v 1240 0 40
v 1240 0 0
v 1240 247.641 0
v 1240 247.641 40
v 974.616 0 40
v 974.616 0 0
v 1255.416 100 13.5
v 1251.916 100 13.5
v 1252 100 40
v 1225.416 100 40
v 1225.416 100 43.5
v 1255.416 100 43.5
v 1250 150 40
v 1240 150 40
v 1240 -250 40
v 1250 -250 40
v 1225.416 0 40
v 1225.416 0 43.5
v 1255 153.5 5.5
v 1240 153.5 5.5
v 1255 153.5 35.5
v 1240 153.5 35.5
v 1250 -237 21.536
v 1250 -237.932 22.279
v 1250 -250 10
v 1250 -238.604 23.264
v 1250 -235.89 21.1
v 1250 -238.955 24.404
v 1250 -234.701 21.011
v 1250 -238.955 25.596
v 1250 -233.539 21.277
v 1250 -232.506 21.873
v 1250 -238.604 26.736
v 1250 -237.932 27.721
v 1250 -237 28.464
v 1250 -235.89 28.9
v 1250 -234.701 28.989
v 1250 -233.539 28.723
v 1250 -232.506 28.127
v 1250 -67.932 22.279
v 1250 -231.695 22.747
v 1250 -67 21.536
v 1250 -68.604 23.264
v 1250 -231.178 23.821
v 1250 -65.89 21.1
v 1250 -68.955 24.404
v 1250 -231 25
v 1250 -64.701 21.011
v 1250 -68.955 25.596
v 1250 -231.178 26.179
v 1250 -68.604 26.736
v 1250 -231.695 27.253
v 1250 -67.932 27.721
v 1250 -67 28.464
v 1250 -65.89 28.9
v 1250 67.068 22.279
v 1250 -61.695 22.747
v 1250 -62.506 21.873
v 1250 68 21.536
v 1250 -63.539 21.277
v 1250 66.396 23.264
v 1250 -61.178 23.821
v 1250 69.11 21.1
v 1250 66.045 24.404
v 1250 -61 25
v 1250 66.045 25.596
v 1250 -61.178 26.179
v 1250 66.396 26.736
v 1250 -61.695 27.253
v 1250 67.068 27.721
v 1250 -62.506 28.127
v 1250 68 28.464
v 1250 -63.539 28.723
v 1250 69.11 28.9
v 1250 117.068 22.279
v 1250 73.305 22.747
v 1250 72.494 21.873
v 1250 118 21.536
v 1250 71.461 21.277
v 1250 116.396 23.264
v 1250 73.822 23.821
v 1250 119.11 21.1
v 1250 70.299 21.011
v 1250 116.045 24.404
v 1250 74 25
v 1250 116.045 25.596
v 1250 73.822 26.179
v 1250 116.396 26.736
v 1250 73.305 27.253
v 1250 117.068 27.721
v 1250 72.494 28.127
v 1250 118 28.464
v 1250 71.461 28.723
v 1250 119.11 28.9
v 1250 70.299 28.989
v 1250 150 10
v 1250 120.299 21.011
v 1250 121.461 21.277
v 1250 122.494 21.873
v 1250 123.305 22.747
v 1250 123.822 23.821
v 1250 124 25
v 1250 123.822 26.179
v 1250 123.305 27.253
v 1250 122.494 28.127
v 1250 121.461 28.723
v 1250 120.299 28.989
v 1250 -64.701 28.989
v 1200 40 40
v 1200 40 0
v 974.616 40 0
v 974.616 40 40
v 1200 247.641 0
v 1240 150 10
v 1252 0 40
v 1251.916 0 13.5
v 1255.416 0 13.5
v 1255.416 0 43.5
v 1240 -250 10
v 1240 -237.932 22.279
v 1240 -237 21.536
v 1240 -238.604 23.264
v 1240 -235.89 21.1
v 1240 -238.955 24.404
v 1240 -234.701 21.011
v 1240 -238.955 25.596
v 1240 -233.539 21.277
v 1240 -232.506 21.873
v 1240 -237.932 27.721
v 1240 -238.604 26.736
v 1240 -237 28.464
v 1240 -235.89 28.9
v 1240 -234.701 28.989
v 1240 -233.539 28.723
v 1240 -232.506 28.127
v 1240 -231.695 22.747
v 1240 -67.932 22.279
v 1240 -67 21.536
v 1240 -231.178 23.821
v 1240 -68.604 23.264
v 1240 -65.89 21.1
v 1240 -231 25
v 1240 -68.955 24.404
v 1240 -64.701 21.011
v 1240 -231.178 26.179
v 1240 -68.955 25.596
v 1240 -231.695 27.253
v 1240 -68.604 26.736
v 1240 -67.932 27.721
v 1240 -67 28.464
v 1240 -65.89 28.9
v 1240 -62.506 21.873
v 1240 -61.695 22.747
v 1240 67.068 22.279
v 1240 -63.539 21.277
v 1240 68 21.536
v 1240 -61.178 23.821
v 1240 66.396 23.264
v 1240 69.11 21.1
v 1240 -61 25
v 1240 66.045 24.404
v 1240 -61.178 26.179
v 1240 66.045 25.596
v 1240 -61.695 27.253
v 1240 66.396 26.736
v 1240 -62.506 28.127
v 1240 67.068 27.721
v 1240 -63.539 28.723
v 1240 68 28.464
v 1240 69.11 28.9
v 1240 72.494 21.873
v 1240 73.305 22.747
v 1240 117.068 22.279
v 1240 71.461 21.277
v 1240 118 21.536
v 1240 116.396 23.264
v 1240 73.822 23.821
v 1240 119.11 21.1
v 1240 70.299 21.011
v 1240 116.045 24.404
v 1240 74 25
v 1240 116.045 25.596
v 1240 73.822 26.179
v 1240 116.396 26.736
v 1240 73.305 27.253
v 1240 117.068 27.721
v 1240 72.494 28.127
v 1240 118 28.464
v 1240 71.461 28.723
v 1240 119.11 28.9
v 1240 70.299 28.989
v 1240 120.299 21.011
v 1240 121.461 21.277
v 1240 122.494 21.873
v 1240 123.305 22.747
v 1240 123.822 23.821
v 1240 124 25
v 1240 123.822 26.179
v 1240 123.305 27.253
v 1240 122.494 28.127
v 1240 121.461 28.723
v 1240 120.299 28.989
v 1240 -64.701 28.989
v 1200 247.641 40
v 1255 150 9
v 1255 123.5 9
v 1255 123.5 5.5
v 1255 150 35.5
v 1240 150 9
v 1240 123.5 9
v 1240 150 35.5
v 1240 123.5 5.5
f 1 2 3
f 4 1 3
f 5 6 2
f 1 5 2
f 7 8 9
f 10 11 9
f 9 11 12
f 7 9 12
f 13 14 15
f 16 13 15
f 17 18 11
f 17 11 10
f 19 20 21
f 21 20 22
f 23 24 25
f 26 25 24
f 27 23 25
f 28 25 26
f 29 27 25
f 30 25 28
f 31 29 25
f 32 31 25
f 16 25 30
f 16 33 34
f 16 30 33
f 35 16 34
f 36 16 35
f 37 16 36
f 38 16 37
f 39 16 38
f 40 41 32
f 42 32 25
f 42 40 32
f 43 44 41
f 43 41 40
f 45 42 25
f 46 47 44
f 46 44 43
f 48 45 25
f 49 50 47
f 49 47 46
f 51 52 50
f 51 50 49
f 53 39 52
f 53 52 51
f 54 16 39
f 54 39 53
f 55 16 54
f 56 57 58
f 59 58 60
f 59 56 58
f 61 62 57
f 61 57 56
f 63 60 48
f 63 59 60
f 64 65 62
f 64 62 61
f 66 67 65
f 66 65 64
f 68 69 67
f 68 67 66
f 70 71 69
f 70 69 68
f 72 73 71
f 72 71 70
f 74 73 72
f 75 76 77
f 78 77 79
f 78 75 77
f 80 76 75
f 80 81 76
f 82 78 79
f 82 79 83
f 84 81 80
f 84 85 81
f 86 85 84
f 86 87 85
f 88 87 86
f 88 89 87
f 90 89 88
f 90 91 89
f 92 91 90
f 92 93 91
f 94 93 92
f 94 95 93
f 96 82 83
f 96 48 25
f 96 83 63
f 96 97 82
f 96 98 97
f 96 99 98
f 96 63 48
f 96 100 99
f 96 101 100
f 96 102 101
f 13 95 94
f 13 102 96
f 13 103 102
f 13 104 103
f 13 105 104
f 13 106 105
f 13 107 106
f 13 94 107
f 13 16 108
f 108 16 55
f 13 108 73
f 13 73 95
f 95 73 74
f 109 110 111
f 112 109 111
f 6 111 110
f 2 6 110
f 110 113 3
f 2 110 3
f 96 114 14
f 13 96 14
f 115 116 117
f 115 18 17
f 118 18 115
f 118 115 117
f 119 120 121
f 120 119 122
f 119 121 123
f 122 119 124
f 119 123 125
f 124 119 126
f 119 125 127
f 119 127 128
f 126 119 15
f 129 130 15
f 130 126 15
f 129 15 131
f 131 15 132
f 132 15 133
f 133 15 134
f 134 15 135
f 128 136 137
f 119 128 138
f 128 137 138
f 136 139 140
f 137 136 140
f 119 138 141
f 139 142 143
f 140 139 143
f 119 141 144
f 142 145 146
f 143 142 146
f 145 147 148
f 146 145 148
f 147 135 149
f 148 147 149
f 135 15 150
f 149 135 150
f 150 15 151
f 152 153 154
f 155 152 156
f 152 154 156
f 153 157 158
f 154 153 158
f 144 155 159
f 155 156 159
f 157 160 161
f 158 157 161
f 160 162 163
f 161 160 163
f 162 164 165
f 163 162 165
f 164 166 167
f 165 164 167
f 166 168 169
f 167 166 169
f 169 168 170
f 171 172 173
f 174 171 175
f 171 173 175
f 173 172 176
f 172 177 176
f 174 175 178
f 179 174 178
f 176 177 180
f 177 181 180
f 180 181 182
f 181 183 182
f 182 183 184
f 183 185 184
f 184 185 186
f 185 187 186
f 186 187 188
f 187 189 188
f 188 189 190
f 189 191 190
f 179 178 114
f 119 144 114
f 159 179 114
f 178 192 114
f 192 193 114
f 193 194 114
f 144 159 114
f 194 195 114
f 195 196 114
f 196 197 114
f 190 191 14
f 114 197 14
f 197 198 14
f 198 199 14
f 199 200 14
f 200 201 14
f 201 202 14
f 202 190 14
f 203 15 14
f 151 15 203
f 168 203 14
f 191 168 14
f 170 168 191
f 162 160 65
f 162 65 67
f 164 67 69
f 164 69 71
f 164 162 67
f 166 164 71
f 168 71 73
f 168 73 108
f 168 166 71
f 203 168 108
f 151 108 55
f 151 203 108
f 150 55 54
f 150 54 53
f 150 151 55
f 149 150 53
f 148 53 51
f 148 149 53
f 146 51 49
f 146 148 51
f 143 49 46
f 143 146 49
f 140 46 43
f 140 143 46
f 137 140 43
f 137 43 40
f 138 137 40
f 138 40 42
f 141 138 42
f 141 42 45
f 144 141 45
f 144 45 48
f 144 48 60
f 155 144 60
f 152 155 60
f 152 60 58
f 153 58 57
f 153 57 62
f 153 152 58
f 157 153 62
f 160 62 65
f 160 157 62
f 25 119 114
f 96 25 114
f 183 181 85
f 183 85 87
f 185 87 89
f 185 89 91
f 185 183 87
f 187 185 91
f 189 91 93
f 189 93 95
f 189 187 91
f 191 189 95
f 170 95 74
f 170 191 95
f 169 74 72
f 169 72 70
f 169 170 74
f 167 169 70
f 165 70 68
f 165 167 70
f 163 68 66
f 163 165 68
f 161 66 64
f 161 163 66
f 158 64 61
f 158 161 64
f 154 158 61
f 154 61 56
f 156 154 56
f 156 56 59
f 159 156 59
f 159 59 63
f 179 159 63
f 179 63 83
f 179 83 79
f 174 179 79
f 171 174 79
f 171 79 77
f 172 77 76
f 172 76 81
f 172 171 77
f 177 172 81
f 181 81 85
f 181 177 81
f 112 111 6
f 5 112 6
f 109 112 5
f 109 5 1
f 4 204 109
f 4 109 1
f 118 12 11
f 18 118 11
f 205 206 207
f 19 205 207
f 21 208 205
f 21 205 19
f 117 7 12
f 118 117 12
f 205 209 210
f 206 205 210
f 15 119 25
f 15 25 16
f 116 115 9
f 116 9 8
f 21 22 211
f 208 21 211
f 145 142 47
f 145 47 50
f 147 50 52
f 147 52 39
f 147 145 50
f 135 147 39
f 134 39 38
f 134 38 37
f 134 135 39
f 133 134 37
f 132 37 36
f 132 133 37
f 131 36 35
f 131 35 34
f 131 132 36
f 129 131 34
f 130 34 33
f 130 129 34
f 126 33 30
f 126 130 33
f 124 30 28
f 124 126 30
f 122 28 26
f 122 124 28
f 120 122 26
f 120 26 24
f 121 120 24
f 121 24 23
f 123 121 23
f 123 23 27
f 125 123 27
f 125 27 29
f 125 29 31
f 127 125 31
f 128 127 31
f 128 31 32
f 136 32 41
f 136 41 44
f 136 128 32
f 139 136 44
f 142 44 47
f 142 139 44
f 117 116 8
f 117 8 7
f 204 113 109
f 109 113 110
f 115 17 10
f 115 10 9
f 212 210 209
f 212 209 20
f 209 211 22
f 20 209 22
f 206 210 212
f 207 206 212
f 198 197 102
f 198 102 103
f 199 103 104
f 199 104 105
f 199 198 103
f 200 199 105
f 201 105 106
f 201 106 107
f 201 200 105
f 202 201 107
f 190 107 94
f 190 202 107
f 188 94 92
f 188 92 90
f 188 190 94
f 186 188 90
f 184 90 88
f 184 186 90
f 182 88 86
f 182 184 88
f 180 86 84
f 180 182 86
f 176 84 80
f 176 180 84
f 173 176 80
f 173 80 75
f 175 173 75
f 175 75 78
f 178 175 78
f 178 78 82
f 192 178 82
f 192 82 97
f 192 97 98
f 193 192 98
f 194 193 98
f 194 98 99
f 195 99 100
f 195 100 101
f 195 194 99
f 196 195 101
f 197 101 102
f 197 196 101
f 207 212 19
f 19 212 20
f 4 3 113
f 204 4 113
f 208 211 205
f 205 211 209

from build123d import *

# Parameters (mm, degrees)
F1_DEPTH = 40
F2_W     = 250
F2_H     = 30
F2_R     = 4
F2_W_2   = 150
F3_DEPTH = 10
F5_DEPTH = 100
F7_DEPTH = 15


with BuildPart() as f1:
    # F0 (on Top) → F1 (new body)
    with BuildSketch(Plane.XY):
        Polygon((974.6156334877, 40), (974.6156334877, 0), (1240, 0), (1240, 247.6407289505), (1200, 247.6407289505), (1200, 40), align=None)
    extrude(amount=F1_DEPTH)


with BuildPart() as f3:
    # F2 (on face) → F3 (new body)
    with BuildSketch(Plane.YZ.offset(1240)):
        with Locations((-125, 25)):
            Rectangle(F2_W, F2_H)
        with Locations((-235, 25)):
            Circle(F2_R, mode=Mode.SUBTRACT)
        with Locations((-65, 25)):
            Circle(F2_R, mode=Mode.SUBTRACT)
        with Locations((75, 25)):
            Rectangle(F2_W_2, F2_H)
        with Locations((70, 25)):
            Circle(F2_R, mode=Mode.SUBTRACT)
        with Locations((120, 25)):
            Circle(F2_R, mode=Mode.SUBTRACT)
    extrude(amount=F3_DEPTH)


with BuildPart() as f5:
    # F4 (on face) → F5 (new body)
    with BuildSketch(Plane.XZ):
        Polygon((1240, 40), (1252, 40), (1251.9164218903, 13.5), (1255.4164218903, 13.5), (1255.4164218903, 43.5), (1225.4164218903, 43.5), (1225.4164218903, 40), align=None)
    extrude(amount=-F5_DEPTH)


with BuildPart() as f7:
    # F6 (on face) → F7 (new body)
    with BuildSketch(Plane.YZ.offset(1240)):
        Polygon((150, 35.5), (150, 10), (150, 9), (123.5, 9), (123.5, 5.5), (153.5, 5.5), (153.5, 35.5), align=None)
    extrude(amount=F7_DEPTH)


solid = Compound([f1.part, f3.part, f5.part, f7.part])
